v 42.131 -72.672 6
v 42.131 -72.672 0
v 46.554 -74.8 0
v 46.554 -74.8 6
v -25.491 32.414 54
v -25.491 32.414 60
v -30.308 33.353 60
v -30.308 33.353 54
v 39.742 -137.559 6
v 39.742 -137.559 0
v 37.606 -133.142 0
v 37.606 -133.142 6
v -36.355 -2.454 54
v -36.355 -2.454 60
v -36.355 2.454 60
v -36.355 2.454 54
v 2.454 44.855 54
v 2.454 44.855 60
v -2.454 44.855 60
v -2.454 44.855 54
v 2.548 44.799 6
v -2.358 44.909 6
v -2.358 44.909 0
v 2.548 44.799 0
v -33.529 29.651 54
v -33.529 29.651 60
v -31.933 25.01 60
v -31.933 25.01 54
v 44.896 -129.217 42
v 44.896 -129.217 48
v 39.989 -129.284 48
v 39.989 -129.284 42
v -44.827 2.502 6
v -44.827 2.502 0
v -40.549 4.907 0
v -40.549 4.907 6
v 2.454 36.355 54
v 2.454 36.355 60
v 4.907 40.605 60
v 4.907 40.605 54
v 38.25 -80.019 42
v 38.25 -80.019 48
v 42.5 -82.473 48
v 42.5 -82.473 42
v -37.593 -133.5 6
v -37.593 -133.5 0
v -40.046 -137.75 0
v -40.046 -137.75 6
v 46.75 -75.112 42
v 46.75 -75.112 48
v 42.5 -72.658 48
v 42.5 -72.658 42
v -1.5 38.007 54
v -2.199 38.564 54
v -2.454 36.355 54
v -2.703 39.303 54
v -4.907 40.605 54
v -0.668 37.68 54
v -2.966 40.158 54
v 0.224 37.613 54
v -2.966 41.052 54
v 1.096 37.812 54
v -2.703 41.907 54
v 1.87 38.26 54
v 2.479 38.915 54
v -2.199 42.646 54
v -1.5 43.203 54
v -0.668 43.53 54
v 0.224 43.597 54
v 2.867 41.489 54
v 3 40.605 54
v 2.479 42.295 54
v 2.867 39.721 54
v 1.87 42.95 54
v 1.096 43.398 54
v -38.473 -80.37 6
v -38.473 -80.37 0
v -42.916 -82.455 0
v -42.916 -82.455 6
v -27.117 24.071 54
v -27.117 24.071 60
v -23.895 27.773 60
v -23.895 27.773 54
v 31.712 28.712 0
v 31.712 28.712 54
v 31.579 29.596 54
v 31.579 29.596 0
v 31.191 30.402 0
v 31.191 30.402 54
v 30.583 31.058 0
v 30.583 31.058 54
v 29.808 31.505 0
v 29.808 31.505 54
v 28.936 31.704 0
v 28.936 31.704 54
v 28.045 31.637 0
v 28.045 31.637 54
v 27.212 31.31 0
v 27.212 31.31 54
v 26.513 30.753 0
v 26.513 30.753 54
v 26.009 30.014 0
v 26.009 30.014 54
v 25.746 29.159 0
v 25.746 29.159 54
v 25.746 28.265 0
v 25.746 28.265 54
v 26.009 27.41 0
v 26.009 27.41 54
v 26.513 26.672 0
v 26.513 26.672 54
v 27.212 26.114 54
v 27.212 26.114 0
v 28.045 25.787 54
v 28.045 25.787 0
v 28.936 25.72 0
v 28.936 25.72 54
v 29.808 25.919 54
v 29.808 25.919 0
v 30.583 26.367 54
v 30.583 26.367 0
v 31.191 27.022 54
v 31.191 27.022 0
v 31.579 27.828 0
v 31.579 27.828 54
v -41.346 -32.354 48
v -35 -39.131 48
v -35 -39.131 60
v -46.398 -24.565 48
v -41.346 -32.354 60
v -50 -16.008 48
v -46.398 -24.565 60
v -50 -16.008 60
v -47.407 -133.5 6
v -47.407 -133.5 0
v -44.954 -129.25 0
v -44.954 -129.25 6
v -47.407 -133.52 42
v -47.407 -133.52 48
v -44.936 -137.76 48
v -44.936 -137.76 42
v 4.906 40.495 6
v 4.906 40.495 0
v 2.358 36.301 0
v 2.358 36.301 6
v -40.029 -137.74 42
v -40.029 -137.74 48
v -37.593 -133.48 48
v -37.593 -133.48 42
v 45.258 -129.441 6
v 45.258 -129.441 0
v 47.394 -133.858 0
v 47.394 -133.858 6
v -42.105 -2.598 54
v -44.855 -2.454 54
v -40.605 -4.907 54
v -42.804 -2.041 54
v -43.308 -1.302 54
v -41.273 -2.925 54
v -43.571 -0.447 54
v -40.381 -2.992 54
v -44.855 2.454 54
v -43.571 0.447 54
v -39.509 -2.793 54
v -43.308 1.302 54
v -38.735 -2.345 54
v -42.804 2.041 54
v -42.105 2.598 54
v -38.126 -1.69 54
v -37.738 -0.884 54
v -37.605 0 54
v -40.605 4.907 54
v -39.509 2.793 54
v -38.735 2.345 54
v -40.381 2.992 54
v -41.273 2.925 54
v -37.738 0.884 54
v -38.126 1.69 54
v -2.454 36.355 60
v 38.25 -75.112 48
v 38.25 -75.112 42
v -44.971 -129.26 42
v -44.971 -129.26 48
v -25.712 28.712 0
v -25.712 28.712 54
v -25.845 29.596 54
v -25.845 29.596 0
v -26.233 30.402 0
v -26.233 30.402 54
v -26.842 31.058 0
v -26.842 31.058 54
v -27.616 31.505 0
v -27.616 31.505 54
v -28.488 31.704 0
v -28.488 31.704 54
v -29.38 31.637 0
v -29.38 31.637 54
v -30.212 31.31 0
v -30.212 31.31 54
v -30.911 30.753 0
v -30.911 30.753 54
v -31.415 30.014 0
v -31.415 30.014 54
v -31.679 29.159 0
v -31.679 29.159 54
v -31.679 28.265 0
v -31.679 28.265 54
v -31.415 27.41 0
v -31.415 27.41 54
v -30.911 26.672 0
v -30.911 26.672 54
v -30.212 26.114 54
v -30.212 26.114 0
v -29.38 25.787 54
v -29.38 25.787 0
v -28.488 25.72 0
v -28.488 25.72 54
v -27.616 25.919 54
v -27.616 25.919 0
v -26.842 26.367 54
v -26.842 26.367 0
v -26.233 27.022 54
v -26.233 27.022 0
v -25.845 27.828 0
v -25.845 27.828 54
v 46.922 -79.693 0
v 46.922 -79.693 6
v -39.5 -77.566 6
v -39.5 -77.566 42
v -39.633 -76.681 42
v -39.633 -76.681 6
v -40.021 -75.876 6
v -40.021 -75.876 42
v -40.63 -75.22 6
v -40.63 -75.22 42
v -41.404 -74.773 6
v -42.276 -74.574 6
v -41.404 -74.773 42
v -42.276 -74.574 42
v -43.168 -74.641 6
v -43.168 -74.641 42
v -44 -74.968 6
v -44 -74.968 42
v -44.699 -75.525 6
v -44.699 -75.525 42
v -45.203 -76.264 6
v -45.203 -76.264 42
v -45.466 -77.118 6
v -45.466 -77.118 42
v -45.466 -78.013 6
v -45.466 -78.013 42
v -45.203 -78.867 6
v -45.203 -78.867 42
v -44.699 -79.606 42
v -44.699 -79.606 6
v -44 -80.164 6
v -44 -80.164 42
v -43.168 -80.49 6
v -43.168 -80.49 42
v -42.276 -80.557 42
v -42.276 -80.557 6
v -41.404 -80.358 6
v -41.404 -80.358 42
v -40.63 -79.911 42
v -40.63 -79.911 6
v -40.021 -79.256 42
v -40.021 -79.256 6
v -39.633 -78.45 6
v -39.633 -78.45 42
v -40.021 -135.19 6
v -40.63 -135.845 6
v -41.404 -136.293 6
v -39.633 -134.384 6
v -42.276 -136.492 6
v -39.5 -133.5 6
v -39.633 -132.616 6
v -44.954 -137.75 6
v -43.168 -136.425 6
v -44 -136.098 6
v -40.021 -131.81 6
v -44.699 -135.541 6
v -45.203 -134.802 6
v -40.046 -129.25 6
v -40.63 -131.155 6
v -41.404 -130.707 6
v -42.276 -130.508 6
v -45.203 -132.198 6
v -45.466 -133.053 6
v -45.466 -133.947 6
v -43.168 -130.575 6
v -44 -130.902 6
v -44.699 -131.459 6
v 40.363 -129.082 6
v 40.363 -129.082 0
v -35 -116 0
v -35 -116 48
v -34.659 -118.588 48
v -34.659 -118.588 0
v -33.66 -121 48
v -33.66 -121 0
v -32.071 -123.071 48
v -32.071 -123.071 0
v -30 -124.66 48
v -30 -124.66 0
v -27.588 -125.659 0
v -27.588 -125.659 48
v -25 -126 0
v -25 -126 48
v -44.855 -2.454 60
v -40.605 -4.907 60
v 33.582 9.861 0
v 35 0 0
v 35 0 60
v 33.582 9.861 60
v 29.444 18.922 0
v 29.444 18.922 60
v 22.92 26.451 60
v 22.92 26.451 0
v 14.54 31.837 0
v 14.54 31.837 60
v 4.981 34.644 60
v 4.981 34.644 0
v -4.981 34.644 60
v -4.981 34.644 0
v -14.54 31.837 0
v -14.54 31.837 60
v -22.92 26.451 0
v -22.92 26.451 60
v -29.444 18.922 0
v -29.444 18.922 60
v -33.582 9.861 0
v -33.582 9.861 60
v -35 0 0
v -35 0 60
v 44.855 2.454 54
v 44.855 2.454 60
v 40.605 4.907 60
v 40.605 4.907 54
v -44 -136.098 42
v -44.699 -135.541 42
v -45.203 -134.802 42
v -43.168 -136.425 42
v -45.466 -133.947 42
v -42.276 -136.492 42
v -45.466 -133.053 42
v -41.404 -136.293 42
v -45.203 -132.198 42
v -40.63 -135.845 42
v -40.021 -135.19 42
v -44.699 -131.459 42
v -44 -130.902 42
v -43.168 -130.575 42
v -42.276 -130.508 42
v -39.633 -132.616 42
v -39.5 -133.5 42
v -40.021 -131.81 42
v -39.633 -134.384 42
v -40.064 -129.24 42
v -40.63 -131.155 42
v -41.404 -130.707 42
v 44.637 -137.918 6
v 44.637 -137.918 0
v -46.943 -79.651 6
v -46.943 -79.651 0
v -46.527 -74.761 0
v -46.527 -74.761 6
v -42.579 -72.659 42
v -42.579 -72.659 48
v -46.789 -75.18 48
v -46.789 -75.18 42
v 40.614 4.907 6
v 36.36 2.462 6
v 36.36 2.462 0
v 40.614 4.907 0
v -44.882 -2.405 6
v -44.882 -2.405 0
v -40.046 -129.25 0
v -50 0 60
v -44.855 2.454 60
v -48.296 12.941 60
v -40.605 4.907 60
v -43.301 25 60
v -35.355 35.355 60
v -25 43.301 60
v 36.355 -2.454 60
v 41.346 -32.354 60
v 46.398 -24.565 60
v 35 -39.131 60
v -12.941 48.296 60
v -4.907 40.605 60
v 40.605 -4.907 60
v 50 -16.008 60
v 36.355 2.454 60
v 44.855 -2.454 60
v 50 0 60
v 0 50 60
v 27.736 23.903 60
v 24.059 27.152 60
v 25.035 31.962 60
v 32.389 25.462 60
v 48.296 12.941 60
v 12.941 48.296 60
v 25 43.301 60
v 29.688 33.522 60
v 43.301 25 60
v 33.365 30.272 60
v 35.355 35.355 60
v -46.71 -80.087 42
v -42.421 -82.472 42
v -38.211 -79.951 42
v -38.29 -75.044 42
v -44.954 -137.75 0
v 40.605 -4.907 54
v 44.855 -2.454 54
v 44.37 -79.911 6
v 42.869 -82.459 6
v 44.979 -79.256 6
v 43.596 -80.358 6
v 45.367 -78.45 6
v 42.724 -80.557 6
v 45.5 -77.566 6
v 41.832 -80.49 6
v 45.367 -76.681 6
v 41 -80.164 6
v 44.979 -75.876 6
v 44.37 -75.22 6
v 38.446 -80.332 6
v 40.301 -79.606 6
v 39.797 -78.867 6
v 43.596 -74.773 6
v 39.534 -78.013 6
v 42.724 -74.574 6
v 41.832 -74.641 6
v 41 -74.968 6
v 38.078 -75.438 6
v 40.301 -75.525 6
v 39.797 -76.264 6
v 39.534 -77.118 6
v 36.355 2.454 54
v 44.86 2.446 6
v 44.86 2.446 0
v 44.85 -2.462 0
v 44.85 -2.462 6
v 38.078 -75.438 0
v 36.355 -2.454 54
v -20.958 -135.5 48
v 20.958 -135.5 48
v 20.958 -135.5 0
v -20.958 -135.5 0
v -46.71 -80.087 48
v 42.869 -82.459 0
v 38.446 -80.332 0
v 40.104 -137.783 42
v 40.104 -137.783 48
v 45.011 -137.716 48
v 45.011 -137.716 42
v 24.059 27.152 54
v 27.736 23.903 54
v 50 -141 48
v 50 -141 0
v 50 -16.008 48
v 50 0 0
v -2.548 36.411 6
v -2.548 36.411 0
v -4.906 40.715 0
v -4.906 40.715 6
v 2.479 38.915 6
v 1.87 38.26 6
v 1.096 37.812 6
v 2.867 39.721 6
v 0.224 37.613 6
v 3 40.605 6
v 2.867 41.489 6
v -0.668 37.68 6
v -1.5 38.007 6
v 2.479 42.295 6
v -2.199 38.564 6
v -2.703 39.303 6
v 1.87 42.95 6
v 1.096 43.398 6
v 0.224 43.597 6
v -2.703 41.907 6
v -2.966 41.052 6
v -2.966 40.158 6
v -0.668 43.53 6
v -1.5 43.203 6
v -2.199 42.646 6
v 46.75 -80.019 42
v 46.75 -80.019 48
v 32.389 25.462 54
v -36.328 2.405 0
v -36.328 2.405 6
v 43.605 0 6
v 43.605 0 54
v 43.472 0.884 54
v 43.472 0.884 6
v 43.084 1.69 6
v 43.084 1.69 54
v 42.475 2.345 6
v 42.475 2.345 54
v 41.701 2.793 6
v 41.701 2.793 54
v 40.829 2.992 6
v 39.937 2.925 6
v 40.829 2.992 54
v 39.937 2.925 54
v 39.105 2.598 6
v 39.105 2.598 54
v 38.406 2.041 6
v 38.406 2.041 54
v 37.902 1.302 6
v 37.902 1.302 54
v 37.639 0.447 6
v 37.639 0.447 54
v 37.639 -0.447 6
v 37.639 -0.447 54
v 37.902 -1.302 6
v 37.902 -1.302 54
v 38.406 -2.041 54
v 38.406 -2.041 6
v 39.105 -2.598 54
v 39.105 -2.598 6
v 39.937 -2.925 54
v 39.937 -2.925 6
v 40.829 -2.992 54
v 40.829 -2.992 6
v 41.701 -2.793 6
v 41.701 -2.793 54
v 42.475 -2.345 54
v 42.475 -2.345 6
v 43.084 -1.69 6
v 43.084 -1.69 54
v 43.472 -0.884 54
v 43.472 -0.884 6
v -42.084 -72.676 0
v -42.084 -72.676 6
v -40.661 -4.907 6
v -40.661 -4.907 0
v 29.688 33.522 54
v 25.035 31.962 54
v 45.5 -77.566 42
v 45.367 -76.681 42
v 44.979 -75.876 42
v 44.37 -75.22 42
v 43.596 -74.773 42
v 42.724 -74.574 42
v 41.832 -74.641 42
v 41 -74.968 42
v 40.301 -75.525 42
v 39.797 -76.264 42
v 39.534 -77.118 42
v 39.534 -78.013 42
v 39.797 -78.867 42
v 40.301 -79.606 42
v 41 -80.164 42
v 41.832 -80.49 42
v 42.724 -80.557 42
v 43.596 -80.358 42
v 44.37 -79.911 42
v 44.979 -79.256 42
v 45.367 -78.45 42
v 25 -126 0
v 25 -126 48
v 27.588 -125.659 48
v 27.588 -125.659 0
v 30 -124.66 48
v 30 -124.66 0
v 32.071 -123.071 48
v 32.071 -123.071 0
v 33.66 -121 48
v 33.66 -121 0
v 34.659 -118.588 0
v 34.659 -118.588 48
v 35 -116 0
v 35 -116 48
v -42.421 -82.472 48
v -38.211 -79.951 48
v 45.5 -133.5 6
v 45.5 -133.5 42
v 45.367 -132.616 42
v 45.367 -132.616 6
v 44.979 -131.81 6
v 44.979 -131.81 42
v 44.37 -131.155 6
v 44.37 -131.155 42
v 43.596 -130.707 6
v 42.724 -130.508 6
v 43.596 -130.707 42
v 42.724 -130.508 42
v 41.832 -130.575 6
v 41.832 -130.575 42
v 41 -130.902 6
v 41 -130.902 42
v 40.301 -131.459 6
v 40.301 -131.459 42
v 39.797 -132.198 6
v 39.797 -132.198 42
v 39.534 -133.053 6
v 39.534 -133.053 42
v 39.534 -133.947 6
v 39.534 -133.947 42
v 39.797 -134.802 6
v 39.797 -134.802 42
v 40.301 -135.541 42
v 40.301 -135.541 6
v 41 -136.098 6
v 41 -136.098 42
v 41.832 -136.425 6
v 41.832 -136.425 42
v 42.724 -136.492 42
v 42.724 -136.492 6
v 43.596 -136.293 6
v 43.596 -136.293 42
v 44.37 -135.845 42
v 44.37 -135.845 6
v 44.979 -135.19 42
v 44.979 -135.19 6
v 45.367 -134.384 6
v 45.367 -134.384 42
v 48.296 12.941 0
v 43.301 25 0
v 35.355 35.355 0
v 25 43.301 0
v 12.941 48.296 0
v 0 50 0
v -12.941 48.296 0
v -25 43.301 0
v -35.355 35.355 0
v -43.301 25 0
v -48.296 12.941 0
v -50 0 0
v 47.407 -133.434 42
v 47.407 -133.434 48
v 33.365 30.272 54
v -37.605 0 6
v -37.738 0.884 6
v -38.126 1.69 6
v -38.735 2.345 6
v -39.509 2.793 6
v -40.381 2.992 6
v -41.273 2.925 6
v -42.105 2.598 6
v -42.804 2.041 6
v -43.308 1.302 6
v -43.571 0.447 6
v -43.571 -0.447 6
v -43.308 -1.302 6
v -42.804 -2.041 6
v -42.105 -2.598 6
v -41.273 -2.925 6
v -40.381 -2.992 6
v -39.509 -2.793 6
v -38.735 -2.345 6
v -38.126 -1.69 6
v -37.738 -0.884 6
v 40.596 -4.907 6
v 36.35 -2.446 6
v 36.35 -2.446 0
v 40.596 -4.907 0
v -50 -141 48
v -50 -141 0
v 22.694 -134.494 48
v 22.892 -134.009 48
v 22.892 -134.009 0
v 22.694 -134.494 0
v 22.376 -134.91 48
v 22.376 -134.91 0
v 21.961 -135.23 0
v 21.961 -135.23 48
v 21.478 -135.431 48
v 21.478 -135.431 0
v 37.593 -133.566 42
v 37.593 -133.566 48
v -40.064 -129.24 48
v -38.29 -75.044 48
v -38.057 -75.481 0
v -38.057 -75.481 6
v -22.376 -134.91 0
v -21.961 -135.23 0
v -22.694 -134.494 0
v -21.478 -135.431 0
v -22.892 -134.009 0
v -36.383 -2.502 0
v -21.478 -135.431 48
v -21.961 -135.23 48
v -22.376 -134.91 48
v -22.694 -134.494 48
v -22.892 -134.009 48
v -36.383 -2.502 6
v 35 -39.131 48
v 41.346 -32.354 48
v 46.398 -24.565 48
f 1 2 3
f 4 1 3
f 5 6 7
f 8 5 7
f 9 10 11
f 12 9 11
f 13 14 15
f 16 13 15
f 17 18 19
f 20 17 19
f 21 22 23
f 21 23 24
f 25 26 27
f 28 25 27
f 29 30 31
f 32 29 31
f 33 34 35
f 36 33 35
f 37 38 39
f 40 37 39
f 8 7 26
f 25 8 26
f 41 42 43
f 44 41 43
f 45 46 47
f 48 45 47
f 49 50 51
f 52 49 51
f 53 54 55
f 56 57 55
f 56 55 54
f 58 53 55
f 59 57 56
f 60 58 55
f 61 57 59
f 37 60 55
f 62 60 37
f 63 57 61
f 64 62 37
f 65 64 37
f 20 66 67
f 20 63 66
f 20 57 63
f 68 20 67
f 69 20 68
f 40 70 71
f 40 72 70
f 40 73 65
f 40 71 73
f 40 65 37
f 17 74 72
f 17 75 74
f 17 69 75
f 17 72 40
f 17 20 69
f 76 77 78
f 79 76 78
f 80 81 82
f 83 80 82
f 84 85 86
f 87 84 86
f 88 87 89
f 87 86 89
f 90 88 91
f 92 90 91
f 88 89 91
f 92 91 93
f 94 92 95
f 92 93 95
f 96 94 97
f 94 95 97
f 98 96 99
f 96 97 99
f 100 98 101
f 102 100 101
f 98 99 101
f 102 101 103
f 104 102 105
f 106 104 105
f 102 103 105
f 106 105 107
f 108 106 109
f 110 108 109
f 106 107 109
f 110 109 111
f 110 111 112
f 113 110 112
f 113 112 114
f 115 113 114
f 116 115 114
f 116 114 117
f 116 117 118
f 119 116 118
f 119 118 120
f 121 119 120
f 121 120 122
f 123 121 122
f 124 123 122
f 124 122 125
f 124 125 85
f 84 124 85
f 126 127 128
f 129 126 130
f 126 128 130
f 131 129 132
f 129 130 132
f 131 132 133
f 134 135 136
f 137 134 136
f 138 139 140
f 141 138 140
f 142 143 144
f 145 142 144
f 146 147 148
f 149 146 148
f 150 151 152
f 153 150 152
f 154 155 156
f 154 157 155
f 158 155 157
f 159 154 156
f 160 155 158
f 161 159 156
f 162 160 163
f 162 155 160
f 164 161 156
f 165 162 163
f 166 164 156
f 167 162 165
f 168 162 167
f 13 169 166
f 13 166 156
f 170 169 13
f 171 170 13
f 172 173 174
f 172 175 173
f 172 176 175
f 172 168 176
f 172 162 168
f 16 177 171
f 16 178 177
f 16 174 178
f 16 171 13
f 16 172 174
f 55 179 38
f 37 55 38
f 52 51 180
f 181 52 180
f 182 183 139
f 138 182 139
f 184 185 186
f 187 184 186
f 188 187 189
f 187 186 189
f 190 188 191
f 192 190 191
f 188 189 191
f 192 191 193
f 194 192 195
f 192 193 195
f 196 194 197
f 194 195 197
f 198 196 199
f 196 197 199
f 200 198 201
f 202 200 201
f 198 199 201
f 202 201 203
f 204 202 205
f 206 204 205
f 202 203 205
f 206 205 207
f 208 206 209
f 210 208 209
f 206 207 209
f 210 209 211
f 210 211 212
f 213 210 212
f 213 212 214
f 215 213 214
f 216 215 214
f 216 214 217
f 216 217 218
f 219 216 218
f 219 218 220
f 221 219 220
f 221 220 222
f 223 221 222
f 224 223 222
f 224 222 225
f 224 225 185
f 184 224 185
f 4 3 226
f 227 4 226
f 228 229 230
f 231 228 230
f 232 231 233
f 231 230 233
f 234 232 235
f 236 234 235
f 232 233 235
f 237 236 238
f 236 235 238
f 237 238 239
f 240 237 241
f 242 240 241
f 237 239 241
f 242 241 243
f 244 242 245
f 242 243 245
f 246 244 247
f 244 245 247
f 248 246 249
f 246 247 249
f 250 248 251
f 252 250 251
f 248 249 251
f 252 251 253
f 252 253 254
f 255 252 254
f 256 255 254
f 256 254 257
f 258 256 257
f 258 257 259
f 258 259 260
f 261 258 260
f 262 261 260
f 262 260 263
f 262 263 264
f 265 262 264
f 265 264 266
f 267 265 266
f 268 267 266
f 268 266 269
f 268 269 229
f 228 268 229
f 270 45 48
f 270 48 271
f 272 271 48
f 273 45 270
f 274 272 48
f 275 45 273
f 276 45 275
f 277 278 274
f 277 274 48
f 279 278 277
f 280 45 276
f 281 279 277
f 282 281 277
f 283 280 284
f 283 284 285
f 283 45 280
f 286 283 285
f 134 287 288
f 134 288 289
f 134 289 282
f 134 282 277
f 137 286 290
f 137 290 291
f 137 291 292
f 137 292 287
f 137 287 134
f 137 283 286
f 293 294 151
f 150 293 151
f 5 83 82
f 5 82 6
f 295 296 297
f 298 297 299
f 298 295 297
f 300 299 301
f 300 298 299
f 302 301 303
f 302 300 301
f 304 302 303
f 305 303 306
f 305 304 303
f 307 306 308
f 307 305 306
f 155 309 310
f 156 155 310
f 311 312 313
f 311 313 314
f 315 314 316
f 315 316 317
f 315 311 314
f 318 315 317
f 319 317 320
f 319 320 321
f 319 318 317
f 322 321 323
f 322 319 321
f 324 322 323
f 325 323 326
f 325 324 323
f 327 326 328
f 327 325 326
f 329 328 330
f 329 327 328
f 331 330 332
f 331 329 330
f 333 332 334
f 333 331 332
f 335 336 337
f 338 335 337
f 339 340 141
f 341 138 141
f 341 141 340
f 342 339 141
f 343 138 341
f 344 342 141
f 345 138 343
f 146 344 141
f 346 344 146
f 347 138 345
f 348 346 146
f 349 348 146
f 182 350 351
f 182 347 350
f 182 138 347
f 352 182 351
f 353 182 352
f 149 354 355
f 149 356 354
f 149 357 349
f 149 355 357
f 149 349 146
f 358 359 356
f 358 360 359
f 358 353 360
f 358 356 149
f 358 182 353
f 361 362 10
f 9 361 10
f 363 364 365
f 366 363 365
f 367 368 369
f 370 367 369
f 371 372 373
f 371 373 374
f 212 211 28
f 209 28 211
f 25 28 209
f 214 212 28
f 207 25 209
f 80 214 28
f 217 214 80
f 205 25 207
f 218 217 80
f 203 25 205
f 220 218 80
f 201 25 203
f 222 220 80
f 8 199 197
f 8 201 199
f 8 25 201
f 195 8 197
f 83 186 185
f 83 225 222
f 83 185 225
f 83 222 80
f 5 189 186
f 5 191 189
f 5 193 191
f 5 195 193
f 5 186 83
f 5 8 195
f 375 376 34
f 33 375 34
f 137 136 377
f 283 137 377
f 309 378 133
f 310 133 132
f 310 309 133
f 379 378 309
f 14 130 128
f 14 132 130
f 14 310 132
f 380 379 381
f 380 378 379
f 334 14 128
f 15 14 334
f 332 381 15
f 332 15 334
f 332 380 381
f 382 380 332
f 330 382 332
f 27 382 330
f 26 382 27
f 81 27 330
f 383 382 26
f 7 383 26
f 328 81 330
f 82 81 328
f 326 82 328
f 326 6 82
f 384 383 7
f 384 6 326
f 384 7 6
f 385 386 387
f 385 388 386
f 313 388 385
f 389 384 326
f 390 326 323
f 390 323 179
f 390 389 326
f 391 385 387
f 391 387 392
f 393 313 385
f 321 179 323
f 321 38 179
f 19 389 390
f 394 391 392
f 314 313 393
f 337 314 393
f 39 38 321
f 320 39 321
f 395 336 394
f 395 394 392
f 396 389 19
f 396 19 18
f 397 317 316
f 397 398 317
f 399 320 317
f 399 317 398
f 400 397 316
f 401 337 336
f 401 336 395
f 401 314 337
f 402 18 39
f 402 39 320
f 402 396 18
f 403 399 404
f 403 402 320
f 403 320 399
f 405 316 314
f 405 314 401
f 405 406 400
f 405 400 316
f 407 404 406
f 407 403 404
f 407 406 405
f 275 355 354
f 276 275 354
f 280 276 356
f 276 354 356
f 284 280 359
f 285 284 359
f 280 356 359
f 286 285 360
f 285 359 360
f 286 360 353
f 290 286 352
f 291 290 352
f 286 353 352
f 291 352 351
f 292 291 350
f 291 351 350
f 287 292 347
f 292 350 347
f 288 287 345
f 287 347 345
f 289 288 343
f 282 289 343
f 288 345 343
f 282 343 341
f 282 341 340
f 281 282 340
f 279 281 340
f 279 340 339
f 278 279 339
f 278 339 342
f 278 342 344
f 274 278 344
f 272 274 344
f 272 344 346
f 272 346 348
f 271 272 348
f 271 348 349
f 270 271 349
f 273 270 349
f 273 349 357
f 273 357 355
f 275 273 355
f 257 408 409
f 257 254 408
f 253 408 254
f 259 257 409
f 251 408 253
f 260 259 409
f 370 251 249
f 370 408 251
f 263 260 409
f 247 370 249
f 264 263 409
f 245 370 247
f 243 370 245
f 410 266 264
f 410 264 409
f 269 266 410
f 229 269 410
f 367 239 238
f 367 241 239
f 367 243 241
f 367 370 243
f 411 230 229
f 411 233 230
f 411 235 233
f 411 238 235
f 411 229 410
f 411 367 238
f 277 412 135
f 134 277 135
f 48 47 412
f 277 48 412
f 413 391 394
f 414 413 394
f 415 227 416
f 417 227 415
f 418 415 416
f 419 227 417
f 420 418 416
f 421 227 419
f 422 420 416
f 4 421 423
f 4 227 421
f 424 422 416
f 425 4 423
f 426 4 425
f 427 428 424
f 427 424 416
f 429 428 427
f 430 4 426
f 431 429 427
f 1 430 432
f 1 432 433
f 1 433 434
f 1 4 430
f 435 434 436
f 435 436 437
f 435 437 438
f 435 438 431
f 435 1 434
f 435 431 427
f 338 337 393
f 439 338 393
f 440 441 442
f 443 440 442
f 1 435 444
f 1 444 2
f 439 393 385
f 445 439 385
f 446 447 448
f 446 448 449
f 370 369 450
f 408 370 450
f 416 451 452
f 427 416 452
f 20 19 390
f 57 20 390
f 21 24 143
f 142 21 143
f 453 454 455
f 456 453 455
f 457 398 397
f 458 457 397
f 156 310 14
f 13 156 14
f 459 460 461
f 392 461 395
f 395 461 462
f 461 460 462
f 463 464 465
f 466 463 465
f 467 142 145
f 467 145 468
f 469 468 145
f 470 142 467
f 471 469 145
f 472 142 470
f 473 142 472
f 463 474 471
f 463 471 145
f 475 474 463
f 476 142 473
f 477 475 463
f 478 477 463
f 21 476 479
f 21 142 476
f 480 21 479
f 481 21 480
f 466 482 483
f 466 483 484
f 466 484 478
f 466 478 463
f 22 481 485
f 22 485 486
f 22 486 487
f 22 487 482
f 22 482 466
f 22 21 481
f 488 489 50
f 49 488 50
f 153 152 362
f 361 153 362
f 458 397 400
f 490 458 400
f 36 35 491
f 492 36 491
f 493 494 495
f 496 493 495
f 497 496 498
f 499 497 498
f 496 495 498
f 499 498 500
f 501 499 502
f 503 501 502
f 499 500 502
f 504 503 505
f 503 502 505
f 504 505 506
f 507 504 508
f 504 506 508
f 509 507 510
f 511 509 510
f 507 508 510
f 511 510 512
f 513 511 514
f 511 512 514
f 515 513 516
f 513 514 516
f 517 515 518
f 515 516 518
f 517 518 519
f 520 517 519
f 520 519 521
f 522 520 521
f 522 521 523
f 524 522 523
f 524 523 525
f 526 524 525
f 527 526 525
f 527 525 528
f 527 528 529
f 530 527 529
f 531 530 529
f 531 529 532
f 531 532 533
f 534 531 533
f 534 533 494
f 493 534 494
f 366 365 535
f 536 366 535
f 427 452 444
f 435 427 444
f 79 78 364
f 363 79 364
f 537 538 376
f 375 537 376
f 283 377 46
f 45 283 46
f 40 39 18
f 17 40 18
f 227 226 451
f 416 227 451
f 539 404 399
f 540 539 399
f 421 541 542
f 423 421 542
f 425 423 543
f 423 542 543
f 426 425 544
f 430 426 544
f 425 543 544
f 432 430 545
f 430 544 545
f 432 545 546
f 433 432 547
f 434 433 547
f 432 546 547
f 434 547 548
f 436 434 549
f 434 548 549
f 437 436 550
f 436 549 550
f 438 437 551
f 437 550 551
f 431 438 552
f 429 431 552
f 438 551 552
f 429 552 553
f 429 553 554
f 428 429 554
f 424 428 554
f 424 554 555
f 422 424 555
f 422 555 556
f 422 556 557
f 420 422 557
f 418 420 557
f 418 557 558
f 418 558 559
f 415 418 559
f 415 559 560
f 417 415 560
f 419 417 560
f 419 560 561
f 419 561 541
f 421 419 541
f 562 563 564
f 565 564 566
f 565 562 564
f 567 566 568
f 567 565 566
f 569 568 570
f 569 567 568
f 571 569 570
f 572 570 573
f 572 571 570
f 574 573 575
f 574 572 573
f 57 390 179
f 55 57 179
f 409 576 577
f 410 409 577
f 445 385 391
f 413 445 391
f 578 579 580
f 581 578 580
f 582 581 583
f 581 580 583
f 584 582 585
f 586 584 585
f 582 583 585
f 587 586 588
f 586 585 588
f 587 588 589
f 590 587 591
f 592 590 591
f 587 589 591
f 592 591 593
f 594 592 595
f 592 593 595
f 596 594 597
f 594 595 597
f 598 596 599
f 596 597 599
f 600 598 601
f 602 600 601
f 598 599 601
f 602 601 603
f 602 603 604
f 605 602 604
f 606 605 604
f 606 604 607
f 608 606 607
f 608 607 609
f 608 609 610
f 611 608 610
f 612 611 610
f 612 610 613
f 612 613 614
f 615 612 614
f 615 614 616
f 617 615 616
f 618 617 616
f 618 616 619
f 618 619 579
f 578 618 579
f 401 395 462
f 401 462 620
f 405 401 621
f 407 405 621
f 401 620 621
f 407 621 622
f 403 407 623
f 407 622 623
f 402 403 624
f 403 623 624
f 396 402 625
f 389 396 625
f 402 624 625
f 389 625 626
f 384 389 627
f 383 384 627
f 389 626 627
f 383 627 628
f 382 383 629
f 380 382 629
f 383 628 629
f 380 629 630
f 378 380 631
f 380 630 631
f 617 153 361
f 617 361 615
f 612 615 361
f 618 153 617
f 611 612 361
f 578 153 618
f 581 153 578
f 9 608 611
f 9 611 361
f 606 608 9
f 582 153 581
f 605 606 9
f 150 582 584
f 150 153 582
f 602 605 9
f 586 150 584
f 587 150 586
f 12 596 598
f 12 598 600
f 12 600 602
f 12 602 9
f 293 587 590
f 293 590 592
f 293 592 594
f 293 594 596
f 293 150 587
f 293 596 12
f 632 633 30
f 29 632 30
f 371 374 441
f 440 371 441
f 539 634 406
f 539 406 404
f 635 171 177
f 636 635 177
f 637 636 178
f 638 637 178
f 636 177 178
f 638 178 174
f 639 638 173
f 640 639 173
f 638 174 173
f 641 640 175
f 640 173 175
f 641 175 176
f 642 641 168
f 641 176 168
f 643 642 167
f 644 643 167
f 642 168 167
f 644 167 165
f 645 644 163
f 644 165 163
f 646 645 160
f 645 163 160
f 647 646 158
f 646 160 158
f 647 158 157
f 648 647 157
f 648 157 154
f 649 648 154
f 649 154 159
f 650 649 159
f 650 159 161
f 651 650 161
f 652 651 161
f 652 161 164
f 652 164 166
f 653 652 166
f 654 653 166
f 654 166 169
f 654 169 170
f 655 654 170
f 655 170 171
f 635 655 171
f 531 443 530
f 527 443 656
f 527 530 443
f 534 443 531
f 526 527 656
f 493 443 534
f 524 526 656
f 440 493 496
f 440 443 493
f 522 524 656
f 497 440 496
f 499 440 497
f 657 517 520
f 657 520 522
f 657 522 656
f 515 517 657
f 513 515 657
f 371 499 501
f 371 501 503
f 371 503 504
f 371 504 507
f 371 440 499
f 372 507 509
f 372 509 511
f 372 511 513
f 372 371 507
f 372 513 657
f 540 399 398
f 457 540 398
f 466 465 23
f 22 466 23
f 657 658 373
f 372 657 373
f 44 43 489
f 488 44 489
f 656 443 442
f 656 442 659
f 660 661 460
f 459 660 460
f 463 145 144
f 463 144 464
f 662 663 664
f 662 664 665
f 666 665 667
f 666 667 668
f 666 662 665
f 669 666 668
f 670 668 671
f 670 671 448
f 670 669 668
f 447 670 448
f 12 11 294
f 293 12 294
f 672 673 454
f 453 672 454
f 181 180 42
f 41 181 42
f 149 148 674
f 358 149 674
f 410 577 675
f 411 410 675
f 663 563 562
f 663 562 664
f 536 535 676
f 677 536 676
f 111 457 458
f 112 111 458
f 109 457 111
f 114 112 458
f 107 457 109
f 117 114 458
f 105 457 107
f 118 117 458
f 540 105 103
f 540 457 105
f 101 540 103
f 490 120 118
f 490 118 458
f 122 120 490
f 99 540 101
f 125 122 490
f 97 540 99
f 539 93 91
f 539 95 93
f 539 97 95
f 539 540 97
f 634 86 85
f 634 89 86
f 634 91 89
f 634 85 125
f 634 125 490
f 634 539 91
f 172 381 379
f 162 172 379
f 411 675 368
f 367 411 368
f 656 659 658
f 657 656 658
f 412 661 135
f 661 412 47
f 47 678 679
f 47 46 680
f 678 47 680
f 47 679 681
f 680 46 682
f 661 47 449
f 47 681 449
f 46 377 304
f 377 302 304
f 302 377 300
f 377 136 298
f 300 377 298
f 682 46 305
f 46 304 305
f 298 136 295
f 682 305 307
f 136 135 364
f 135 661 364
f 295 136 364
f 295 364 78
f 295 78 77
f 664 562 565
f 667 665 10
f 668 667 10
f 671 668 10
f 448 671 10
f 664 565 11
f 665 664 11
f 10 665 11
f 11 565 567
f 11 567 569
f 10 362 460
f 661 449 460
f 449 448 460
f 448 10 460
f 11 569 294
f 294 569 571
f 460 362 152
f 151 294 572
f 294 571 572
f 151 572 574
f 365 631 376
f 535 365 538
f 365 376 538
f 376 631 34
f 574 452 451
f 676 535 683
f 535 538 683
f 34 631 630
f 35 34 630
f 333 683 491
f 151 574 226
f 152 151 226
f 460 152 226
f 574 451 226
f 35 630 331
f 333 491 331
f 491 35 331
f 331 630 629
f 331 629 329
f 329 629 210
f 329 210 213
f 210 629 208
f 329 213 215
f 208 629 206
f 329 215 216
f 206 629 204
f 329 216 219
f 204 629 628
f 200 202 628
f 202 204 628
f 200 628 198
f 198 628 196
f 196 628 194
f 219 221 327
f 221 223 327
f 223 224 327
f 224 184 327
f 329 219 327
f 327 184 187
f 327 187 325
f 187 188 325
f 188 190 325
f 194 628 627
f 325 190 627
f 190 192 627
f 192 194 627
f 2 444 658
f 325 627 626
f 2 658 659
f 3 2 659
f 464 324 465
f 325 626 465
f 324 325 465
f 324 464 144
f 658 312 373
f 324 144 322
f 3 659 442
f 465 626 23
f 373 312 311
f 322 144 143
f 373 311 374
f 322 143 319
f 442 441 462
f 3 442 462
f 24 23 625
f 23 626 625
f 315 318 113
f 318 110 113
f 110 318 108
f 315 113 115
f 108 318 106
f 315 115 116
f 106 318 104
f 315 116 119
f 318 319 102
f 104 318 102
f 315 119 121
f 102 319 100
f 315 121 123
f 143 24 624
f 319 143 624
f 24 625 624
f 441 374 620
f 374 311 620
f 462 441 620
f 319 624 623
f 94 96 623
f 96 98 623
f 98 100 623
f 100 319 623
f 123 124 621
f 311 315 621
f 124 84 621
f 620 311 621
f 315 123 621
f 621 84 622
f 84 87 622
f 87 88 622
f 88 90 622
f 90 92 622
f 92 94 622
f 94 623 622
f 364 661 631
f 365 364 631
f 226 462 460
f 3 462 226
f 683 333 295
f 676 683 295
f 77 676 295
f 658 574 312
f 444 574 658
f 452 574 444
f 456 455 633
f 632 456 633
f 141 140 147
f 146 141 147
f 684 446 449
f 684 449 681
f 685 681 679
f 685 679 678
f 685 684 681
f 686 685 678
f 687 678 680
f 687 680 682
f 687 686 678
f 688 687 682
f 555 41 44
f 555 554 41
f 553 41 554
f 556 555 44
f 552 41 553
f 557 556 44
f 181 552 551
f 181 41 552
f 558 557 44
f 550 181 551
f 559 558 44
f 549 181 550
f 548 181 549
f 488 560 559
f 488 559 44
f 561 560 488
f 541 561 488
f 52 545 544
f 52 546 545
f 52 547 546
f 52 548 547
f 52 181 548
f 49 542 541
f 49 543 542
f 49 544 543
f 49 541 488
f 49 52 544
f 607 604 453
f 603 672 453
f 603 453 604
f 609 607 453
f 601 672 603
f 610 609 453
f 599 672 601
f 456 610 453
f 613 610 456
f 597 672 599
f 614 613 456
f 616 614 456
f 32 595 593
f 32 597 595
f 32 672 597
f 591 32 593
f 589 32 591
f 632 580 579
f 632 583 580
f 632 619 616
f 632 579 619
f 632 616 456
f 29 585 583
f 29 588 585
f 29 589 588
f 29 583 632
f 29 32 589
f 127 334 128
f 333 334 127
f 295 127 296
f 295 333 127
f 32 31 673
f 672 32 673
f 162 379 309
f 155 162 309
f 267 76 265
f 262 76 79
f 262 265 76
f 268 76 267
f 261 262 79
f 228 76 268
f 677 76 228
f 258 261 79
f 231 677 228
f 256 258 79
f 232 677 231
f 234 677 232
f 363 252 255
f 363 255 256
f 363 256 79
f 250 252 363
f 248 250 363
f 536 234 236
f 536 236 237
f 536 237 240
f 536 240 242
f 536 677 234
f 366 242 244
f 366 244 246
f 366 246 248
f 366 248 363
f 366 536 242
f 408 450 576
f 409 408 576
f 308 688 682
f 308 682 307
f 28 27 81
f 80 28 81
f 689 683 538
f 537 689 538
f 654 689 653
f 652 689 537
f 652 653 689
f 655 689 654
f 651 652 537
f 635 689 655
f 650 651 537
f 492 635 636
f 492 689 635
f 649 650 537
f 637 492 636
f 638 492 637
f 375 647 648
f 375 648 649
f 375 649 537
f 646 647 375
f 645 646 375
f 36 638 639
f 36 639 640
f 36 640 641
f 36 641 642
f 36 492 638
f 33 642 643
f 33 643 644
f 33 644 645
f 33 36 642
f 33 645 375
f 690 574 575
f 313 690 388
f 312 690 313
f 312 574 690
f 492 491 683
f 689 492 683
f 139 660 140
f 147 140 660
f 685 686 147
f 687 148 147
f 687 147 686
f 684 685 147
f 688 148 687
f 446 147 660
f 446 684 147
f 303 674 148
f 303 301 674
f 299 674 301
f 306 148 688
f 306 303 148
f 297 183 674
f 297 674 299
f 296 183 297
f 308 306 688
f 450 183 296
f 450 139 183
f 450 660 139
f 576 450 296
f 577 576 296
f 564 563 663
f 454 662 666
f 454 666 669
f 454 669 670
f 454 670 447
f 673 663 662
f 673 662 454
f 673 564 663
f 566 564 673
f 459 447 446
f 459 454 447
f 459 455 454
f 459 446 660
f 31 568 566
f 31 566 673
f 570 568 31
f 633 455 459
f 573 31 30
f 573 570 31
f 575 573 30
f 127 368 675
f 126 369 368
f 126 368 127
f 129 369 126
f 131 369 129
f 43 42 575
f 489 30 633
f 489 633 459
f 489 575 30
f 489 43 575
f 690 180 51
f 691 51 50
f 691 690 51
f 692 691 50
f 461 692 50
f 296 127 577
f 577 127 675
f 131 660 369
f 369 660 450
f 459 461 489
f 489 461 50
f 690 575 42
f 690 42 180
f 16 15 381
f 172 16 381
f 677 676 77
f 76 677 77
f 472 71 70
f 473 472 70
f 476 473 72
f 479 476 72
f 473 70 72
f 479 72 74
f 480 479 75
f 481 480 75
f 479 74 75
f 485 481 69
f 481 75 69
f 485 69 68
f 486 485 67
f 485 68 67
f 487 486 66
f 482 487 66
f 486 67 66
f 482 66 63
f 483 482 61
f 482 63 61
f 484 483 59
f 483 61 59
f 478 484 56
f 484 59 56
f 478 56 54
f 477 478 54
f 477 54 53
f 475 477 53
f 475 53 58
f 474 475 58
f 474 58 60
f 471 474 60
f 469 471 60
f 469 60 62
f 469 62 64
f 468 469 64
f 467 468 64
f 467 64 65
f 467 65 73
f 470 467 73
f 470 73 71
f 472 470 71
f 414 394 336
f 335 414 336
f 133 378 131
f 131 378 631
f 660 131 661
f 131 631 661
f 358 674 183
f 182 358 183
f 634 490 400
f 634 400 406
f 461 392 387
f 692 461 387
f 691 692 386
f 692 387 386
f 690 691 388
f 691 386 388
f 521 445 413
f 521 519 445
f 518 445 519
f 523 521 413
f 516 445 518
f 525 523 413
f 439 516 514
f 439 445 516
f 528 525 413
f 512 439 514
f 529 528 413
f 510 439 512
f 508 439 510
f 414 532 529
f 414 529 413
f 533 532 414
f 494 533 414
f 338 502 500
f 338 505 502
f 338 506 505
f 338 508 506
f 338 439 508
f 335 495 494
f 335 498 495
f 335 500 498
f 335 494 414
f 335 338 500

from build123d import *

# Parameters (mm, degrees)
SALIENTE_EXTRUIR1_DEPTH = 60
CROQUIS2_R              = 3
CORTAR_EXTRUIR1_DEPTH   = 60
CORTAR_EXTRUIR2_DEPTH   = 6
CORTAR_EXTRUIR3_DEPTH   = 12
CROQUIS5_R              = 3
CORTAR_EXTRUIR4_DEPTH   = 48
CORTAR_EXTRUIR5_DEPTH   = 6
CORTAR_EXTRUIR6_DEPTH   = 6
CORTAR_EXTRUIR7_DEPTH   = 48


with BuildPart() as part:
    # Croquis1 → Saliente-Extruir1 (new body)
    with BuildSketch(Plane.XY):
        with BuildLine():
            Line((-50, 0), (-50, -141))
            Line((-50, -141), (50, -141))
            Line((50, -141), (50, 0))
            ThreePointArc((50, 0), (0, 50), (-50, 0))
        make_face()
        with BuildLine():
            Line((-35, 0), (-35, -116))
            ThreePointArc((-35, -116), (-32.071067812, -123.071067812), (-25, -126))
            Line((-25, -126), (25, -126))
            ThreePointArc((25, -126), (32.071067812, -123.071067812), (35, -116))
            Line((35, -116), (35, 0))
            ThreePointArc((35, 0), (0, 35), (-35, 0))
        make_face(mode=Mode.SUBTRACT)
    extrude(amount=SALIENTE_EXTRUIR1_DEPTH)

    # Croquis2 → Cortar-Extruir1 (cut)
    with BuildSketch(Plane.XY.offset(60)):
        with Locations((0, 40.605)):
            Circle(CROQUIS2_R)
        with Locations((28.71207085, 28.71207085)):
            Circle(CROQUIS2_R)
        with Locations((40.605, 0)):
            Circle(CROQUIS2_R)
        with Locations((-40.605, 0)):
            Circle(CROQUIS2_R)
        with Locations((-28.71207085, 28.71207085)):
            Circle(CROQUIS2_R)
    extrude(amount=-CORTAR_EXTRUIR1_DEPTH, mode=Mode.SUBTRACT)

    # Croquis3 → Cortar-Extruir2 (cut)
    with BuildSketch(Plane.XY.offset(60)):
        Polygon((4.907477288, 40.605), (2.453738644, 44.855), (-2.453738644, 44.855), (-4.907477288, 40.605), (-2.453738644, 36.355), (2.453738644, 36.355), align=None)
        Polygon((33.365133185, 30.271668311), (29.687950997, 33.521539768), (25.034888662, 31.961942307), (24.059008515, 27.152473389), (27.736190704, 23.902601932), (32.389253039, 25.462199393), align=None)
        Polygon((40.605, -4.907477288), (44.855, -2.453738644), (44.855, 2.453738644), (40.605, 4.907477288), (36.355, 2.453738644), (36.355, -2.453738644), align=None)
        Polygon((-33.528922476, 29.650832668), (-31.933488245, 25.009935885), (-27.11663662, 24.071174067), (-23.895219225, 27.773309032), (-25.490653455, 32.414205815), (-30.30750508, 33.352967633), align=None)
        Polygon((-40.605, 4.907477288), (-44.855, 2.453738644), (-44.855, -2.453738644), (-40.605, -4.907477288), (-36.355, -2.453738644), (-36.355, 2.453738644), align=None)
    extrude(amount=-CORTAR_EXTRUIR2_DEPTH, mode=Mode.SUBTRACT)

    # Croquis4 → Cortar-Extruir3 (cut)
    with BuildSketch(Plane.XY.offset(60)):
        with BuildLine():
            Line((-50, -16.007810594), (-50, -141))
            Line((-50, -141), (50, -141))
            Line((50, -141), (50, -16.007810594))
            ThreePointArc((50, -16.007810594), (0, -52.5), (-50, -16.007810594))
        make_face()
    extrude(amount=-CORTAR_EXTRUIR3_DEPTH, mode=Mode.SUBTRACT)

    # Croquis5 → Cortar-Extruir4 (cut)
    with BuildSketch(Plane.XY.offset(48)):
        with Locations((-42.5, -77.565594803)):
            Circle(CROQUIS5_R)
        with Locations((-42.5, -133.5)):
            Circle(CROQUIS5_R)
        with Locations((42.5, -77.565594803)):
            Circle(CROQUIS5_R)
        with Locations((42.5, -133.5)):
            Circle(CROQUIS5_R)
    extrude(amount=-CORTAR_EXTRUIR4_DEPTH, mode=Mode.SUBTRACT)

    # Croquis6 → Cortar-Extruir5 (cut)
    with BuildSketch(Plane.XY.offset(48)):
        Polygon((-42.421317924, -82.472441292), (-38.21120525, -79.950877371), (-38.289887326, -75.044030882), (-42.578682076, -72.658748314), (-46.78879475, -75.180312235), (-46.710112674, -80.087158724), align=None)
        Polygon((42.5, -82.473072091), (46.75, -80.019333447), (46.75, -75.111856159), (42.5, -72.658117515), (38.25, -75.111856159), (38.25, -80.019333447), align=None)
        Polygon((-40.063566251, -129.240055878), (-44.971002953, -129.260014418), (-47.407436703, -133.519958539), (-44.936433749, -137.759944122), (-40.028997047, -137.739985582), (-37.592563297, -133.480041461), align=None)
        Polygon((44.895973885, -129.217168871), (39.988946385, -129.283610185), (37.5929725, -133.566441313), (40.104026115, -137.782831129), (45.011053615, -137.716389815), (47.4070275, -133.433558687), align=None)
    extrude(amount=-CORTAR_EXTRUIR5_DEPTH, mode=Mode.SUBTRACT)

    # Croquis7 → Cortar-Extruir6 (cut)
    with BuildSketch(Plane(origin=(0, 0, 0), x_dir=(-1, 0, 0), z_dir=(0, 0, -1))):
        Polygon((2.357863822, 44.908929778), (-2.548380612, 44.798934857), (-4.906244434, 40.49500508), (-2.357863822, 36.301070222), (2.548380612, 36.411065143), (4.906244434, 40.71499492), align=None)
        Polygon((-40.614441302, 4.907468206), (-44.859712786, 2.445557696), (-44.850271484, -2.461910511), (-40.595558698, -4.907468206), (-36.350287214, -2.445557696), (-36.359728516, 2.461910511), align=None)
        Polygon((44.882492584, -2.405491744), (44.826963251, 2.50167137), (40.549470667, 4.907163114), (36.327507416, 2.405491744), (36.383036749, -2.50167137), (40.660529333, -4.907163114), align=None)
        Polygon((-42.131373877, -72.671981811), (-46.553680106, -74.79954872), (-46.922306229, -79.693161712), (-42.868626123, -82.459207795), (-38.446319894, -80.331640886), (-38.077693771, -75.438027894), align=None)
        Polygon((42.084370643, -72.675749655), (38.057455203, -75.480617811), (38.47308456, -80.370462959), (42.915629357, -82.455439951), (46.942544797, -79.650571795), (46.52691544, -74.760726647), align=None)
        Polygon((47.407477288, -133.5), (44.953738644, -129.25), (40.046261356, -129.25), (37.592522712, -133.5), (40.046261356, -137.75), (44.953738644, -137.75), align=None)
        Polygon((-44.636850652, -137.917827818), (-39.742474206, -137.559480857), (-37.605623555, -133.14165304), (-40.363149348, -129.082172182), (-45.257525794, -129.440519143), (-47.394376445, -133.85834696), align=None)
    extrude(amount=-CORTAR_EXTRUIR6_DEPTH, mode=Mode.SUBTRACT)

    # Croquis8 → Cortar-Extruir7 (cut)
    with BuildSketch(Plane.XY.offset(48)):
        with BuildLine():
            Line((-22.892371948, -134.008986599), (-25, -126))
            Line((-25, -126), (25, -126))
            Line((25, -126), (22.892371948, -134.008986599))
            ThreePointArc((22.892371948, -134.008986599), (22.17929347, -135.083978093), (20.958222873, -135.5))
            Line((20.958222873, -135.5), (-20.958222873, -135.5))
            ThreePointArc((-20.958222873, -135.5), (-22.17929347, -135.083978093), (-22.892371948, -134.008986599))
        make_face()
    extrude(amount=-CORTAR_EXTRUIR7_DEPTH, mode=Mode.SUBTRACT)


solid = part.part
